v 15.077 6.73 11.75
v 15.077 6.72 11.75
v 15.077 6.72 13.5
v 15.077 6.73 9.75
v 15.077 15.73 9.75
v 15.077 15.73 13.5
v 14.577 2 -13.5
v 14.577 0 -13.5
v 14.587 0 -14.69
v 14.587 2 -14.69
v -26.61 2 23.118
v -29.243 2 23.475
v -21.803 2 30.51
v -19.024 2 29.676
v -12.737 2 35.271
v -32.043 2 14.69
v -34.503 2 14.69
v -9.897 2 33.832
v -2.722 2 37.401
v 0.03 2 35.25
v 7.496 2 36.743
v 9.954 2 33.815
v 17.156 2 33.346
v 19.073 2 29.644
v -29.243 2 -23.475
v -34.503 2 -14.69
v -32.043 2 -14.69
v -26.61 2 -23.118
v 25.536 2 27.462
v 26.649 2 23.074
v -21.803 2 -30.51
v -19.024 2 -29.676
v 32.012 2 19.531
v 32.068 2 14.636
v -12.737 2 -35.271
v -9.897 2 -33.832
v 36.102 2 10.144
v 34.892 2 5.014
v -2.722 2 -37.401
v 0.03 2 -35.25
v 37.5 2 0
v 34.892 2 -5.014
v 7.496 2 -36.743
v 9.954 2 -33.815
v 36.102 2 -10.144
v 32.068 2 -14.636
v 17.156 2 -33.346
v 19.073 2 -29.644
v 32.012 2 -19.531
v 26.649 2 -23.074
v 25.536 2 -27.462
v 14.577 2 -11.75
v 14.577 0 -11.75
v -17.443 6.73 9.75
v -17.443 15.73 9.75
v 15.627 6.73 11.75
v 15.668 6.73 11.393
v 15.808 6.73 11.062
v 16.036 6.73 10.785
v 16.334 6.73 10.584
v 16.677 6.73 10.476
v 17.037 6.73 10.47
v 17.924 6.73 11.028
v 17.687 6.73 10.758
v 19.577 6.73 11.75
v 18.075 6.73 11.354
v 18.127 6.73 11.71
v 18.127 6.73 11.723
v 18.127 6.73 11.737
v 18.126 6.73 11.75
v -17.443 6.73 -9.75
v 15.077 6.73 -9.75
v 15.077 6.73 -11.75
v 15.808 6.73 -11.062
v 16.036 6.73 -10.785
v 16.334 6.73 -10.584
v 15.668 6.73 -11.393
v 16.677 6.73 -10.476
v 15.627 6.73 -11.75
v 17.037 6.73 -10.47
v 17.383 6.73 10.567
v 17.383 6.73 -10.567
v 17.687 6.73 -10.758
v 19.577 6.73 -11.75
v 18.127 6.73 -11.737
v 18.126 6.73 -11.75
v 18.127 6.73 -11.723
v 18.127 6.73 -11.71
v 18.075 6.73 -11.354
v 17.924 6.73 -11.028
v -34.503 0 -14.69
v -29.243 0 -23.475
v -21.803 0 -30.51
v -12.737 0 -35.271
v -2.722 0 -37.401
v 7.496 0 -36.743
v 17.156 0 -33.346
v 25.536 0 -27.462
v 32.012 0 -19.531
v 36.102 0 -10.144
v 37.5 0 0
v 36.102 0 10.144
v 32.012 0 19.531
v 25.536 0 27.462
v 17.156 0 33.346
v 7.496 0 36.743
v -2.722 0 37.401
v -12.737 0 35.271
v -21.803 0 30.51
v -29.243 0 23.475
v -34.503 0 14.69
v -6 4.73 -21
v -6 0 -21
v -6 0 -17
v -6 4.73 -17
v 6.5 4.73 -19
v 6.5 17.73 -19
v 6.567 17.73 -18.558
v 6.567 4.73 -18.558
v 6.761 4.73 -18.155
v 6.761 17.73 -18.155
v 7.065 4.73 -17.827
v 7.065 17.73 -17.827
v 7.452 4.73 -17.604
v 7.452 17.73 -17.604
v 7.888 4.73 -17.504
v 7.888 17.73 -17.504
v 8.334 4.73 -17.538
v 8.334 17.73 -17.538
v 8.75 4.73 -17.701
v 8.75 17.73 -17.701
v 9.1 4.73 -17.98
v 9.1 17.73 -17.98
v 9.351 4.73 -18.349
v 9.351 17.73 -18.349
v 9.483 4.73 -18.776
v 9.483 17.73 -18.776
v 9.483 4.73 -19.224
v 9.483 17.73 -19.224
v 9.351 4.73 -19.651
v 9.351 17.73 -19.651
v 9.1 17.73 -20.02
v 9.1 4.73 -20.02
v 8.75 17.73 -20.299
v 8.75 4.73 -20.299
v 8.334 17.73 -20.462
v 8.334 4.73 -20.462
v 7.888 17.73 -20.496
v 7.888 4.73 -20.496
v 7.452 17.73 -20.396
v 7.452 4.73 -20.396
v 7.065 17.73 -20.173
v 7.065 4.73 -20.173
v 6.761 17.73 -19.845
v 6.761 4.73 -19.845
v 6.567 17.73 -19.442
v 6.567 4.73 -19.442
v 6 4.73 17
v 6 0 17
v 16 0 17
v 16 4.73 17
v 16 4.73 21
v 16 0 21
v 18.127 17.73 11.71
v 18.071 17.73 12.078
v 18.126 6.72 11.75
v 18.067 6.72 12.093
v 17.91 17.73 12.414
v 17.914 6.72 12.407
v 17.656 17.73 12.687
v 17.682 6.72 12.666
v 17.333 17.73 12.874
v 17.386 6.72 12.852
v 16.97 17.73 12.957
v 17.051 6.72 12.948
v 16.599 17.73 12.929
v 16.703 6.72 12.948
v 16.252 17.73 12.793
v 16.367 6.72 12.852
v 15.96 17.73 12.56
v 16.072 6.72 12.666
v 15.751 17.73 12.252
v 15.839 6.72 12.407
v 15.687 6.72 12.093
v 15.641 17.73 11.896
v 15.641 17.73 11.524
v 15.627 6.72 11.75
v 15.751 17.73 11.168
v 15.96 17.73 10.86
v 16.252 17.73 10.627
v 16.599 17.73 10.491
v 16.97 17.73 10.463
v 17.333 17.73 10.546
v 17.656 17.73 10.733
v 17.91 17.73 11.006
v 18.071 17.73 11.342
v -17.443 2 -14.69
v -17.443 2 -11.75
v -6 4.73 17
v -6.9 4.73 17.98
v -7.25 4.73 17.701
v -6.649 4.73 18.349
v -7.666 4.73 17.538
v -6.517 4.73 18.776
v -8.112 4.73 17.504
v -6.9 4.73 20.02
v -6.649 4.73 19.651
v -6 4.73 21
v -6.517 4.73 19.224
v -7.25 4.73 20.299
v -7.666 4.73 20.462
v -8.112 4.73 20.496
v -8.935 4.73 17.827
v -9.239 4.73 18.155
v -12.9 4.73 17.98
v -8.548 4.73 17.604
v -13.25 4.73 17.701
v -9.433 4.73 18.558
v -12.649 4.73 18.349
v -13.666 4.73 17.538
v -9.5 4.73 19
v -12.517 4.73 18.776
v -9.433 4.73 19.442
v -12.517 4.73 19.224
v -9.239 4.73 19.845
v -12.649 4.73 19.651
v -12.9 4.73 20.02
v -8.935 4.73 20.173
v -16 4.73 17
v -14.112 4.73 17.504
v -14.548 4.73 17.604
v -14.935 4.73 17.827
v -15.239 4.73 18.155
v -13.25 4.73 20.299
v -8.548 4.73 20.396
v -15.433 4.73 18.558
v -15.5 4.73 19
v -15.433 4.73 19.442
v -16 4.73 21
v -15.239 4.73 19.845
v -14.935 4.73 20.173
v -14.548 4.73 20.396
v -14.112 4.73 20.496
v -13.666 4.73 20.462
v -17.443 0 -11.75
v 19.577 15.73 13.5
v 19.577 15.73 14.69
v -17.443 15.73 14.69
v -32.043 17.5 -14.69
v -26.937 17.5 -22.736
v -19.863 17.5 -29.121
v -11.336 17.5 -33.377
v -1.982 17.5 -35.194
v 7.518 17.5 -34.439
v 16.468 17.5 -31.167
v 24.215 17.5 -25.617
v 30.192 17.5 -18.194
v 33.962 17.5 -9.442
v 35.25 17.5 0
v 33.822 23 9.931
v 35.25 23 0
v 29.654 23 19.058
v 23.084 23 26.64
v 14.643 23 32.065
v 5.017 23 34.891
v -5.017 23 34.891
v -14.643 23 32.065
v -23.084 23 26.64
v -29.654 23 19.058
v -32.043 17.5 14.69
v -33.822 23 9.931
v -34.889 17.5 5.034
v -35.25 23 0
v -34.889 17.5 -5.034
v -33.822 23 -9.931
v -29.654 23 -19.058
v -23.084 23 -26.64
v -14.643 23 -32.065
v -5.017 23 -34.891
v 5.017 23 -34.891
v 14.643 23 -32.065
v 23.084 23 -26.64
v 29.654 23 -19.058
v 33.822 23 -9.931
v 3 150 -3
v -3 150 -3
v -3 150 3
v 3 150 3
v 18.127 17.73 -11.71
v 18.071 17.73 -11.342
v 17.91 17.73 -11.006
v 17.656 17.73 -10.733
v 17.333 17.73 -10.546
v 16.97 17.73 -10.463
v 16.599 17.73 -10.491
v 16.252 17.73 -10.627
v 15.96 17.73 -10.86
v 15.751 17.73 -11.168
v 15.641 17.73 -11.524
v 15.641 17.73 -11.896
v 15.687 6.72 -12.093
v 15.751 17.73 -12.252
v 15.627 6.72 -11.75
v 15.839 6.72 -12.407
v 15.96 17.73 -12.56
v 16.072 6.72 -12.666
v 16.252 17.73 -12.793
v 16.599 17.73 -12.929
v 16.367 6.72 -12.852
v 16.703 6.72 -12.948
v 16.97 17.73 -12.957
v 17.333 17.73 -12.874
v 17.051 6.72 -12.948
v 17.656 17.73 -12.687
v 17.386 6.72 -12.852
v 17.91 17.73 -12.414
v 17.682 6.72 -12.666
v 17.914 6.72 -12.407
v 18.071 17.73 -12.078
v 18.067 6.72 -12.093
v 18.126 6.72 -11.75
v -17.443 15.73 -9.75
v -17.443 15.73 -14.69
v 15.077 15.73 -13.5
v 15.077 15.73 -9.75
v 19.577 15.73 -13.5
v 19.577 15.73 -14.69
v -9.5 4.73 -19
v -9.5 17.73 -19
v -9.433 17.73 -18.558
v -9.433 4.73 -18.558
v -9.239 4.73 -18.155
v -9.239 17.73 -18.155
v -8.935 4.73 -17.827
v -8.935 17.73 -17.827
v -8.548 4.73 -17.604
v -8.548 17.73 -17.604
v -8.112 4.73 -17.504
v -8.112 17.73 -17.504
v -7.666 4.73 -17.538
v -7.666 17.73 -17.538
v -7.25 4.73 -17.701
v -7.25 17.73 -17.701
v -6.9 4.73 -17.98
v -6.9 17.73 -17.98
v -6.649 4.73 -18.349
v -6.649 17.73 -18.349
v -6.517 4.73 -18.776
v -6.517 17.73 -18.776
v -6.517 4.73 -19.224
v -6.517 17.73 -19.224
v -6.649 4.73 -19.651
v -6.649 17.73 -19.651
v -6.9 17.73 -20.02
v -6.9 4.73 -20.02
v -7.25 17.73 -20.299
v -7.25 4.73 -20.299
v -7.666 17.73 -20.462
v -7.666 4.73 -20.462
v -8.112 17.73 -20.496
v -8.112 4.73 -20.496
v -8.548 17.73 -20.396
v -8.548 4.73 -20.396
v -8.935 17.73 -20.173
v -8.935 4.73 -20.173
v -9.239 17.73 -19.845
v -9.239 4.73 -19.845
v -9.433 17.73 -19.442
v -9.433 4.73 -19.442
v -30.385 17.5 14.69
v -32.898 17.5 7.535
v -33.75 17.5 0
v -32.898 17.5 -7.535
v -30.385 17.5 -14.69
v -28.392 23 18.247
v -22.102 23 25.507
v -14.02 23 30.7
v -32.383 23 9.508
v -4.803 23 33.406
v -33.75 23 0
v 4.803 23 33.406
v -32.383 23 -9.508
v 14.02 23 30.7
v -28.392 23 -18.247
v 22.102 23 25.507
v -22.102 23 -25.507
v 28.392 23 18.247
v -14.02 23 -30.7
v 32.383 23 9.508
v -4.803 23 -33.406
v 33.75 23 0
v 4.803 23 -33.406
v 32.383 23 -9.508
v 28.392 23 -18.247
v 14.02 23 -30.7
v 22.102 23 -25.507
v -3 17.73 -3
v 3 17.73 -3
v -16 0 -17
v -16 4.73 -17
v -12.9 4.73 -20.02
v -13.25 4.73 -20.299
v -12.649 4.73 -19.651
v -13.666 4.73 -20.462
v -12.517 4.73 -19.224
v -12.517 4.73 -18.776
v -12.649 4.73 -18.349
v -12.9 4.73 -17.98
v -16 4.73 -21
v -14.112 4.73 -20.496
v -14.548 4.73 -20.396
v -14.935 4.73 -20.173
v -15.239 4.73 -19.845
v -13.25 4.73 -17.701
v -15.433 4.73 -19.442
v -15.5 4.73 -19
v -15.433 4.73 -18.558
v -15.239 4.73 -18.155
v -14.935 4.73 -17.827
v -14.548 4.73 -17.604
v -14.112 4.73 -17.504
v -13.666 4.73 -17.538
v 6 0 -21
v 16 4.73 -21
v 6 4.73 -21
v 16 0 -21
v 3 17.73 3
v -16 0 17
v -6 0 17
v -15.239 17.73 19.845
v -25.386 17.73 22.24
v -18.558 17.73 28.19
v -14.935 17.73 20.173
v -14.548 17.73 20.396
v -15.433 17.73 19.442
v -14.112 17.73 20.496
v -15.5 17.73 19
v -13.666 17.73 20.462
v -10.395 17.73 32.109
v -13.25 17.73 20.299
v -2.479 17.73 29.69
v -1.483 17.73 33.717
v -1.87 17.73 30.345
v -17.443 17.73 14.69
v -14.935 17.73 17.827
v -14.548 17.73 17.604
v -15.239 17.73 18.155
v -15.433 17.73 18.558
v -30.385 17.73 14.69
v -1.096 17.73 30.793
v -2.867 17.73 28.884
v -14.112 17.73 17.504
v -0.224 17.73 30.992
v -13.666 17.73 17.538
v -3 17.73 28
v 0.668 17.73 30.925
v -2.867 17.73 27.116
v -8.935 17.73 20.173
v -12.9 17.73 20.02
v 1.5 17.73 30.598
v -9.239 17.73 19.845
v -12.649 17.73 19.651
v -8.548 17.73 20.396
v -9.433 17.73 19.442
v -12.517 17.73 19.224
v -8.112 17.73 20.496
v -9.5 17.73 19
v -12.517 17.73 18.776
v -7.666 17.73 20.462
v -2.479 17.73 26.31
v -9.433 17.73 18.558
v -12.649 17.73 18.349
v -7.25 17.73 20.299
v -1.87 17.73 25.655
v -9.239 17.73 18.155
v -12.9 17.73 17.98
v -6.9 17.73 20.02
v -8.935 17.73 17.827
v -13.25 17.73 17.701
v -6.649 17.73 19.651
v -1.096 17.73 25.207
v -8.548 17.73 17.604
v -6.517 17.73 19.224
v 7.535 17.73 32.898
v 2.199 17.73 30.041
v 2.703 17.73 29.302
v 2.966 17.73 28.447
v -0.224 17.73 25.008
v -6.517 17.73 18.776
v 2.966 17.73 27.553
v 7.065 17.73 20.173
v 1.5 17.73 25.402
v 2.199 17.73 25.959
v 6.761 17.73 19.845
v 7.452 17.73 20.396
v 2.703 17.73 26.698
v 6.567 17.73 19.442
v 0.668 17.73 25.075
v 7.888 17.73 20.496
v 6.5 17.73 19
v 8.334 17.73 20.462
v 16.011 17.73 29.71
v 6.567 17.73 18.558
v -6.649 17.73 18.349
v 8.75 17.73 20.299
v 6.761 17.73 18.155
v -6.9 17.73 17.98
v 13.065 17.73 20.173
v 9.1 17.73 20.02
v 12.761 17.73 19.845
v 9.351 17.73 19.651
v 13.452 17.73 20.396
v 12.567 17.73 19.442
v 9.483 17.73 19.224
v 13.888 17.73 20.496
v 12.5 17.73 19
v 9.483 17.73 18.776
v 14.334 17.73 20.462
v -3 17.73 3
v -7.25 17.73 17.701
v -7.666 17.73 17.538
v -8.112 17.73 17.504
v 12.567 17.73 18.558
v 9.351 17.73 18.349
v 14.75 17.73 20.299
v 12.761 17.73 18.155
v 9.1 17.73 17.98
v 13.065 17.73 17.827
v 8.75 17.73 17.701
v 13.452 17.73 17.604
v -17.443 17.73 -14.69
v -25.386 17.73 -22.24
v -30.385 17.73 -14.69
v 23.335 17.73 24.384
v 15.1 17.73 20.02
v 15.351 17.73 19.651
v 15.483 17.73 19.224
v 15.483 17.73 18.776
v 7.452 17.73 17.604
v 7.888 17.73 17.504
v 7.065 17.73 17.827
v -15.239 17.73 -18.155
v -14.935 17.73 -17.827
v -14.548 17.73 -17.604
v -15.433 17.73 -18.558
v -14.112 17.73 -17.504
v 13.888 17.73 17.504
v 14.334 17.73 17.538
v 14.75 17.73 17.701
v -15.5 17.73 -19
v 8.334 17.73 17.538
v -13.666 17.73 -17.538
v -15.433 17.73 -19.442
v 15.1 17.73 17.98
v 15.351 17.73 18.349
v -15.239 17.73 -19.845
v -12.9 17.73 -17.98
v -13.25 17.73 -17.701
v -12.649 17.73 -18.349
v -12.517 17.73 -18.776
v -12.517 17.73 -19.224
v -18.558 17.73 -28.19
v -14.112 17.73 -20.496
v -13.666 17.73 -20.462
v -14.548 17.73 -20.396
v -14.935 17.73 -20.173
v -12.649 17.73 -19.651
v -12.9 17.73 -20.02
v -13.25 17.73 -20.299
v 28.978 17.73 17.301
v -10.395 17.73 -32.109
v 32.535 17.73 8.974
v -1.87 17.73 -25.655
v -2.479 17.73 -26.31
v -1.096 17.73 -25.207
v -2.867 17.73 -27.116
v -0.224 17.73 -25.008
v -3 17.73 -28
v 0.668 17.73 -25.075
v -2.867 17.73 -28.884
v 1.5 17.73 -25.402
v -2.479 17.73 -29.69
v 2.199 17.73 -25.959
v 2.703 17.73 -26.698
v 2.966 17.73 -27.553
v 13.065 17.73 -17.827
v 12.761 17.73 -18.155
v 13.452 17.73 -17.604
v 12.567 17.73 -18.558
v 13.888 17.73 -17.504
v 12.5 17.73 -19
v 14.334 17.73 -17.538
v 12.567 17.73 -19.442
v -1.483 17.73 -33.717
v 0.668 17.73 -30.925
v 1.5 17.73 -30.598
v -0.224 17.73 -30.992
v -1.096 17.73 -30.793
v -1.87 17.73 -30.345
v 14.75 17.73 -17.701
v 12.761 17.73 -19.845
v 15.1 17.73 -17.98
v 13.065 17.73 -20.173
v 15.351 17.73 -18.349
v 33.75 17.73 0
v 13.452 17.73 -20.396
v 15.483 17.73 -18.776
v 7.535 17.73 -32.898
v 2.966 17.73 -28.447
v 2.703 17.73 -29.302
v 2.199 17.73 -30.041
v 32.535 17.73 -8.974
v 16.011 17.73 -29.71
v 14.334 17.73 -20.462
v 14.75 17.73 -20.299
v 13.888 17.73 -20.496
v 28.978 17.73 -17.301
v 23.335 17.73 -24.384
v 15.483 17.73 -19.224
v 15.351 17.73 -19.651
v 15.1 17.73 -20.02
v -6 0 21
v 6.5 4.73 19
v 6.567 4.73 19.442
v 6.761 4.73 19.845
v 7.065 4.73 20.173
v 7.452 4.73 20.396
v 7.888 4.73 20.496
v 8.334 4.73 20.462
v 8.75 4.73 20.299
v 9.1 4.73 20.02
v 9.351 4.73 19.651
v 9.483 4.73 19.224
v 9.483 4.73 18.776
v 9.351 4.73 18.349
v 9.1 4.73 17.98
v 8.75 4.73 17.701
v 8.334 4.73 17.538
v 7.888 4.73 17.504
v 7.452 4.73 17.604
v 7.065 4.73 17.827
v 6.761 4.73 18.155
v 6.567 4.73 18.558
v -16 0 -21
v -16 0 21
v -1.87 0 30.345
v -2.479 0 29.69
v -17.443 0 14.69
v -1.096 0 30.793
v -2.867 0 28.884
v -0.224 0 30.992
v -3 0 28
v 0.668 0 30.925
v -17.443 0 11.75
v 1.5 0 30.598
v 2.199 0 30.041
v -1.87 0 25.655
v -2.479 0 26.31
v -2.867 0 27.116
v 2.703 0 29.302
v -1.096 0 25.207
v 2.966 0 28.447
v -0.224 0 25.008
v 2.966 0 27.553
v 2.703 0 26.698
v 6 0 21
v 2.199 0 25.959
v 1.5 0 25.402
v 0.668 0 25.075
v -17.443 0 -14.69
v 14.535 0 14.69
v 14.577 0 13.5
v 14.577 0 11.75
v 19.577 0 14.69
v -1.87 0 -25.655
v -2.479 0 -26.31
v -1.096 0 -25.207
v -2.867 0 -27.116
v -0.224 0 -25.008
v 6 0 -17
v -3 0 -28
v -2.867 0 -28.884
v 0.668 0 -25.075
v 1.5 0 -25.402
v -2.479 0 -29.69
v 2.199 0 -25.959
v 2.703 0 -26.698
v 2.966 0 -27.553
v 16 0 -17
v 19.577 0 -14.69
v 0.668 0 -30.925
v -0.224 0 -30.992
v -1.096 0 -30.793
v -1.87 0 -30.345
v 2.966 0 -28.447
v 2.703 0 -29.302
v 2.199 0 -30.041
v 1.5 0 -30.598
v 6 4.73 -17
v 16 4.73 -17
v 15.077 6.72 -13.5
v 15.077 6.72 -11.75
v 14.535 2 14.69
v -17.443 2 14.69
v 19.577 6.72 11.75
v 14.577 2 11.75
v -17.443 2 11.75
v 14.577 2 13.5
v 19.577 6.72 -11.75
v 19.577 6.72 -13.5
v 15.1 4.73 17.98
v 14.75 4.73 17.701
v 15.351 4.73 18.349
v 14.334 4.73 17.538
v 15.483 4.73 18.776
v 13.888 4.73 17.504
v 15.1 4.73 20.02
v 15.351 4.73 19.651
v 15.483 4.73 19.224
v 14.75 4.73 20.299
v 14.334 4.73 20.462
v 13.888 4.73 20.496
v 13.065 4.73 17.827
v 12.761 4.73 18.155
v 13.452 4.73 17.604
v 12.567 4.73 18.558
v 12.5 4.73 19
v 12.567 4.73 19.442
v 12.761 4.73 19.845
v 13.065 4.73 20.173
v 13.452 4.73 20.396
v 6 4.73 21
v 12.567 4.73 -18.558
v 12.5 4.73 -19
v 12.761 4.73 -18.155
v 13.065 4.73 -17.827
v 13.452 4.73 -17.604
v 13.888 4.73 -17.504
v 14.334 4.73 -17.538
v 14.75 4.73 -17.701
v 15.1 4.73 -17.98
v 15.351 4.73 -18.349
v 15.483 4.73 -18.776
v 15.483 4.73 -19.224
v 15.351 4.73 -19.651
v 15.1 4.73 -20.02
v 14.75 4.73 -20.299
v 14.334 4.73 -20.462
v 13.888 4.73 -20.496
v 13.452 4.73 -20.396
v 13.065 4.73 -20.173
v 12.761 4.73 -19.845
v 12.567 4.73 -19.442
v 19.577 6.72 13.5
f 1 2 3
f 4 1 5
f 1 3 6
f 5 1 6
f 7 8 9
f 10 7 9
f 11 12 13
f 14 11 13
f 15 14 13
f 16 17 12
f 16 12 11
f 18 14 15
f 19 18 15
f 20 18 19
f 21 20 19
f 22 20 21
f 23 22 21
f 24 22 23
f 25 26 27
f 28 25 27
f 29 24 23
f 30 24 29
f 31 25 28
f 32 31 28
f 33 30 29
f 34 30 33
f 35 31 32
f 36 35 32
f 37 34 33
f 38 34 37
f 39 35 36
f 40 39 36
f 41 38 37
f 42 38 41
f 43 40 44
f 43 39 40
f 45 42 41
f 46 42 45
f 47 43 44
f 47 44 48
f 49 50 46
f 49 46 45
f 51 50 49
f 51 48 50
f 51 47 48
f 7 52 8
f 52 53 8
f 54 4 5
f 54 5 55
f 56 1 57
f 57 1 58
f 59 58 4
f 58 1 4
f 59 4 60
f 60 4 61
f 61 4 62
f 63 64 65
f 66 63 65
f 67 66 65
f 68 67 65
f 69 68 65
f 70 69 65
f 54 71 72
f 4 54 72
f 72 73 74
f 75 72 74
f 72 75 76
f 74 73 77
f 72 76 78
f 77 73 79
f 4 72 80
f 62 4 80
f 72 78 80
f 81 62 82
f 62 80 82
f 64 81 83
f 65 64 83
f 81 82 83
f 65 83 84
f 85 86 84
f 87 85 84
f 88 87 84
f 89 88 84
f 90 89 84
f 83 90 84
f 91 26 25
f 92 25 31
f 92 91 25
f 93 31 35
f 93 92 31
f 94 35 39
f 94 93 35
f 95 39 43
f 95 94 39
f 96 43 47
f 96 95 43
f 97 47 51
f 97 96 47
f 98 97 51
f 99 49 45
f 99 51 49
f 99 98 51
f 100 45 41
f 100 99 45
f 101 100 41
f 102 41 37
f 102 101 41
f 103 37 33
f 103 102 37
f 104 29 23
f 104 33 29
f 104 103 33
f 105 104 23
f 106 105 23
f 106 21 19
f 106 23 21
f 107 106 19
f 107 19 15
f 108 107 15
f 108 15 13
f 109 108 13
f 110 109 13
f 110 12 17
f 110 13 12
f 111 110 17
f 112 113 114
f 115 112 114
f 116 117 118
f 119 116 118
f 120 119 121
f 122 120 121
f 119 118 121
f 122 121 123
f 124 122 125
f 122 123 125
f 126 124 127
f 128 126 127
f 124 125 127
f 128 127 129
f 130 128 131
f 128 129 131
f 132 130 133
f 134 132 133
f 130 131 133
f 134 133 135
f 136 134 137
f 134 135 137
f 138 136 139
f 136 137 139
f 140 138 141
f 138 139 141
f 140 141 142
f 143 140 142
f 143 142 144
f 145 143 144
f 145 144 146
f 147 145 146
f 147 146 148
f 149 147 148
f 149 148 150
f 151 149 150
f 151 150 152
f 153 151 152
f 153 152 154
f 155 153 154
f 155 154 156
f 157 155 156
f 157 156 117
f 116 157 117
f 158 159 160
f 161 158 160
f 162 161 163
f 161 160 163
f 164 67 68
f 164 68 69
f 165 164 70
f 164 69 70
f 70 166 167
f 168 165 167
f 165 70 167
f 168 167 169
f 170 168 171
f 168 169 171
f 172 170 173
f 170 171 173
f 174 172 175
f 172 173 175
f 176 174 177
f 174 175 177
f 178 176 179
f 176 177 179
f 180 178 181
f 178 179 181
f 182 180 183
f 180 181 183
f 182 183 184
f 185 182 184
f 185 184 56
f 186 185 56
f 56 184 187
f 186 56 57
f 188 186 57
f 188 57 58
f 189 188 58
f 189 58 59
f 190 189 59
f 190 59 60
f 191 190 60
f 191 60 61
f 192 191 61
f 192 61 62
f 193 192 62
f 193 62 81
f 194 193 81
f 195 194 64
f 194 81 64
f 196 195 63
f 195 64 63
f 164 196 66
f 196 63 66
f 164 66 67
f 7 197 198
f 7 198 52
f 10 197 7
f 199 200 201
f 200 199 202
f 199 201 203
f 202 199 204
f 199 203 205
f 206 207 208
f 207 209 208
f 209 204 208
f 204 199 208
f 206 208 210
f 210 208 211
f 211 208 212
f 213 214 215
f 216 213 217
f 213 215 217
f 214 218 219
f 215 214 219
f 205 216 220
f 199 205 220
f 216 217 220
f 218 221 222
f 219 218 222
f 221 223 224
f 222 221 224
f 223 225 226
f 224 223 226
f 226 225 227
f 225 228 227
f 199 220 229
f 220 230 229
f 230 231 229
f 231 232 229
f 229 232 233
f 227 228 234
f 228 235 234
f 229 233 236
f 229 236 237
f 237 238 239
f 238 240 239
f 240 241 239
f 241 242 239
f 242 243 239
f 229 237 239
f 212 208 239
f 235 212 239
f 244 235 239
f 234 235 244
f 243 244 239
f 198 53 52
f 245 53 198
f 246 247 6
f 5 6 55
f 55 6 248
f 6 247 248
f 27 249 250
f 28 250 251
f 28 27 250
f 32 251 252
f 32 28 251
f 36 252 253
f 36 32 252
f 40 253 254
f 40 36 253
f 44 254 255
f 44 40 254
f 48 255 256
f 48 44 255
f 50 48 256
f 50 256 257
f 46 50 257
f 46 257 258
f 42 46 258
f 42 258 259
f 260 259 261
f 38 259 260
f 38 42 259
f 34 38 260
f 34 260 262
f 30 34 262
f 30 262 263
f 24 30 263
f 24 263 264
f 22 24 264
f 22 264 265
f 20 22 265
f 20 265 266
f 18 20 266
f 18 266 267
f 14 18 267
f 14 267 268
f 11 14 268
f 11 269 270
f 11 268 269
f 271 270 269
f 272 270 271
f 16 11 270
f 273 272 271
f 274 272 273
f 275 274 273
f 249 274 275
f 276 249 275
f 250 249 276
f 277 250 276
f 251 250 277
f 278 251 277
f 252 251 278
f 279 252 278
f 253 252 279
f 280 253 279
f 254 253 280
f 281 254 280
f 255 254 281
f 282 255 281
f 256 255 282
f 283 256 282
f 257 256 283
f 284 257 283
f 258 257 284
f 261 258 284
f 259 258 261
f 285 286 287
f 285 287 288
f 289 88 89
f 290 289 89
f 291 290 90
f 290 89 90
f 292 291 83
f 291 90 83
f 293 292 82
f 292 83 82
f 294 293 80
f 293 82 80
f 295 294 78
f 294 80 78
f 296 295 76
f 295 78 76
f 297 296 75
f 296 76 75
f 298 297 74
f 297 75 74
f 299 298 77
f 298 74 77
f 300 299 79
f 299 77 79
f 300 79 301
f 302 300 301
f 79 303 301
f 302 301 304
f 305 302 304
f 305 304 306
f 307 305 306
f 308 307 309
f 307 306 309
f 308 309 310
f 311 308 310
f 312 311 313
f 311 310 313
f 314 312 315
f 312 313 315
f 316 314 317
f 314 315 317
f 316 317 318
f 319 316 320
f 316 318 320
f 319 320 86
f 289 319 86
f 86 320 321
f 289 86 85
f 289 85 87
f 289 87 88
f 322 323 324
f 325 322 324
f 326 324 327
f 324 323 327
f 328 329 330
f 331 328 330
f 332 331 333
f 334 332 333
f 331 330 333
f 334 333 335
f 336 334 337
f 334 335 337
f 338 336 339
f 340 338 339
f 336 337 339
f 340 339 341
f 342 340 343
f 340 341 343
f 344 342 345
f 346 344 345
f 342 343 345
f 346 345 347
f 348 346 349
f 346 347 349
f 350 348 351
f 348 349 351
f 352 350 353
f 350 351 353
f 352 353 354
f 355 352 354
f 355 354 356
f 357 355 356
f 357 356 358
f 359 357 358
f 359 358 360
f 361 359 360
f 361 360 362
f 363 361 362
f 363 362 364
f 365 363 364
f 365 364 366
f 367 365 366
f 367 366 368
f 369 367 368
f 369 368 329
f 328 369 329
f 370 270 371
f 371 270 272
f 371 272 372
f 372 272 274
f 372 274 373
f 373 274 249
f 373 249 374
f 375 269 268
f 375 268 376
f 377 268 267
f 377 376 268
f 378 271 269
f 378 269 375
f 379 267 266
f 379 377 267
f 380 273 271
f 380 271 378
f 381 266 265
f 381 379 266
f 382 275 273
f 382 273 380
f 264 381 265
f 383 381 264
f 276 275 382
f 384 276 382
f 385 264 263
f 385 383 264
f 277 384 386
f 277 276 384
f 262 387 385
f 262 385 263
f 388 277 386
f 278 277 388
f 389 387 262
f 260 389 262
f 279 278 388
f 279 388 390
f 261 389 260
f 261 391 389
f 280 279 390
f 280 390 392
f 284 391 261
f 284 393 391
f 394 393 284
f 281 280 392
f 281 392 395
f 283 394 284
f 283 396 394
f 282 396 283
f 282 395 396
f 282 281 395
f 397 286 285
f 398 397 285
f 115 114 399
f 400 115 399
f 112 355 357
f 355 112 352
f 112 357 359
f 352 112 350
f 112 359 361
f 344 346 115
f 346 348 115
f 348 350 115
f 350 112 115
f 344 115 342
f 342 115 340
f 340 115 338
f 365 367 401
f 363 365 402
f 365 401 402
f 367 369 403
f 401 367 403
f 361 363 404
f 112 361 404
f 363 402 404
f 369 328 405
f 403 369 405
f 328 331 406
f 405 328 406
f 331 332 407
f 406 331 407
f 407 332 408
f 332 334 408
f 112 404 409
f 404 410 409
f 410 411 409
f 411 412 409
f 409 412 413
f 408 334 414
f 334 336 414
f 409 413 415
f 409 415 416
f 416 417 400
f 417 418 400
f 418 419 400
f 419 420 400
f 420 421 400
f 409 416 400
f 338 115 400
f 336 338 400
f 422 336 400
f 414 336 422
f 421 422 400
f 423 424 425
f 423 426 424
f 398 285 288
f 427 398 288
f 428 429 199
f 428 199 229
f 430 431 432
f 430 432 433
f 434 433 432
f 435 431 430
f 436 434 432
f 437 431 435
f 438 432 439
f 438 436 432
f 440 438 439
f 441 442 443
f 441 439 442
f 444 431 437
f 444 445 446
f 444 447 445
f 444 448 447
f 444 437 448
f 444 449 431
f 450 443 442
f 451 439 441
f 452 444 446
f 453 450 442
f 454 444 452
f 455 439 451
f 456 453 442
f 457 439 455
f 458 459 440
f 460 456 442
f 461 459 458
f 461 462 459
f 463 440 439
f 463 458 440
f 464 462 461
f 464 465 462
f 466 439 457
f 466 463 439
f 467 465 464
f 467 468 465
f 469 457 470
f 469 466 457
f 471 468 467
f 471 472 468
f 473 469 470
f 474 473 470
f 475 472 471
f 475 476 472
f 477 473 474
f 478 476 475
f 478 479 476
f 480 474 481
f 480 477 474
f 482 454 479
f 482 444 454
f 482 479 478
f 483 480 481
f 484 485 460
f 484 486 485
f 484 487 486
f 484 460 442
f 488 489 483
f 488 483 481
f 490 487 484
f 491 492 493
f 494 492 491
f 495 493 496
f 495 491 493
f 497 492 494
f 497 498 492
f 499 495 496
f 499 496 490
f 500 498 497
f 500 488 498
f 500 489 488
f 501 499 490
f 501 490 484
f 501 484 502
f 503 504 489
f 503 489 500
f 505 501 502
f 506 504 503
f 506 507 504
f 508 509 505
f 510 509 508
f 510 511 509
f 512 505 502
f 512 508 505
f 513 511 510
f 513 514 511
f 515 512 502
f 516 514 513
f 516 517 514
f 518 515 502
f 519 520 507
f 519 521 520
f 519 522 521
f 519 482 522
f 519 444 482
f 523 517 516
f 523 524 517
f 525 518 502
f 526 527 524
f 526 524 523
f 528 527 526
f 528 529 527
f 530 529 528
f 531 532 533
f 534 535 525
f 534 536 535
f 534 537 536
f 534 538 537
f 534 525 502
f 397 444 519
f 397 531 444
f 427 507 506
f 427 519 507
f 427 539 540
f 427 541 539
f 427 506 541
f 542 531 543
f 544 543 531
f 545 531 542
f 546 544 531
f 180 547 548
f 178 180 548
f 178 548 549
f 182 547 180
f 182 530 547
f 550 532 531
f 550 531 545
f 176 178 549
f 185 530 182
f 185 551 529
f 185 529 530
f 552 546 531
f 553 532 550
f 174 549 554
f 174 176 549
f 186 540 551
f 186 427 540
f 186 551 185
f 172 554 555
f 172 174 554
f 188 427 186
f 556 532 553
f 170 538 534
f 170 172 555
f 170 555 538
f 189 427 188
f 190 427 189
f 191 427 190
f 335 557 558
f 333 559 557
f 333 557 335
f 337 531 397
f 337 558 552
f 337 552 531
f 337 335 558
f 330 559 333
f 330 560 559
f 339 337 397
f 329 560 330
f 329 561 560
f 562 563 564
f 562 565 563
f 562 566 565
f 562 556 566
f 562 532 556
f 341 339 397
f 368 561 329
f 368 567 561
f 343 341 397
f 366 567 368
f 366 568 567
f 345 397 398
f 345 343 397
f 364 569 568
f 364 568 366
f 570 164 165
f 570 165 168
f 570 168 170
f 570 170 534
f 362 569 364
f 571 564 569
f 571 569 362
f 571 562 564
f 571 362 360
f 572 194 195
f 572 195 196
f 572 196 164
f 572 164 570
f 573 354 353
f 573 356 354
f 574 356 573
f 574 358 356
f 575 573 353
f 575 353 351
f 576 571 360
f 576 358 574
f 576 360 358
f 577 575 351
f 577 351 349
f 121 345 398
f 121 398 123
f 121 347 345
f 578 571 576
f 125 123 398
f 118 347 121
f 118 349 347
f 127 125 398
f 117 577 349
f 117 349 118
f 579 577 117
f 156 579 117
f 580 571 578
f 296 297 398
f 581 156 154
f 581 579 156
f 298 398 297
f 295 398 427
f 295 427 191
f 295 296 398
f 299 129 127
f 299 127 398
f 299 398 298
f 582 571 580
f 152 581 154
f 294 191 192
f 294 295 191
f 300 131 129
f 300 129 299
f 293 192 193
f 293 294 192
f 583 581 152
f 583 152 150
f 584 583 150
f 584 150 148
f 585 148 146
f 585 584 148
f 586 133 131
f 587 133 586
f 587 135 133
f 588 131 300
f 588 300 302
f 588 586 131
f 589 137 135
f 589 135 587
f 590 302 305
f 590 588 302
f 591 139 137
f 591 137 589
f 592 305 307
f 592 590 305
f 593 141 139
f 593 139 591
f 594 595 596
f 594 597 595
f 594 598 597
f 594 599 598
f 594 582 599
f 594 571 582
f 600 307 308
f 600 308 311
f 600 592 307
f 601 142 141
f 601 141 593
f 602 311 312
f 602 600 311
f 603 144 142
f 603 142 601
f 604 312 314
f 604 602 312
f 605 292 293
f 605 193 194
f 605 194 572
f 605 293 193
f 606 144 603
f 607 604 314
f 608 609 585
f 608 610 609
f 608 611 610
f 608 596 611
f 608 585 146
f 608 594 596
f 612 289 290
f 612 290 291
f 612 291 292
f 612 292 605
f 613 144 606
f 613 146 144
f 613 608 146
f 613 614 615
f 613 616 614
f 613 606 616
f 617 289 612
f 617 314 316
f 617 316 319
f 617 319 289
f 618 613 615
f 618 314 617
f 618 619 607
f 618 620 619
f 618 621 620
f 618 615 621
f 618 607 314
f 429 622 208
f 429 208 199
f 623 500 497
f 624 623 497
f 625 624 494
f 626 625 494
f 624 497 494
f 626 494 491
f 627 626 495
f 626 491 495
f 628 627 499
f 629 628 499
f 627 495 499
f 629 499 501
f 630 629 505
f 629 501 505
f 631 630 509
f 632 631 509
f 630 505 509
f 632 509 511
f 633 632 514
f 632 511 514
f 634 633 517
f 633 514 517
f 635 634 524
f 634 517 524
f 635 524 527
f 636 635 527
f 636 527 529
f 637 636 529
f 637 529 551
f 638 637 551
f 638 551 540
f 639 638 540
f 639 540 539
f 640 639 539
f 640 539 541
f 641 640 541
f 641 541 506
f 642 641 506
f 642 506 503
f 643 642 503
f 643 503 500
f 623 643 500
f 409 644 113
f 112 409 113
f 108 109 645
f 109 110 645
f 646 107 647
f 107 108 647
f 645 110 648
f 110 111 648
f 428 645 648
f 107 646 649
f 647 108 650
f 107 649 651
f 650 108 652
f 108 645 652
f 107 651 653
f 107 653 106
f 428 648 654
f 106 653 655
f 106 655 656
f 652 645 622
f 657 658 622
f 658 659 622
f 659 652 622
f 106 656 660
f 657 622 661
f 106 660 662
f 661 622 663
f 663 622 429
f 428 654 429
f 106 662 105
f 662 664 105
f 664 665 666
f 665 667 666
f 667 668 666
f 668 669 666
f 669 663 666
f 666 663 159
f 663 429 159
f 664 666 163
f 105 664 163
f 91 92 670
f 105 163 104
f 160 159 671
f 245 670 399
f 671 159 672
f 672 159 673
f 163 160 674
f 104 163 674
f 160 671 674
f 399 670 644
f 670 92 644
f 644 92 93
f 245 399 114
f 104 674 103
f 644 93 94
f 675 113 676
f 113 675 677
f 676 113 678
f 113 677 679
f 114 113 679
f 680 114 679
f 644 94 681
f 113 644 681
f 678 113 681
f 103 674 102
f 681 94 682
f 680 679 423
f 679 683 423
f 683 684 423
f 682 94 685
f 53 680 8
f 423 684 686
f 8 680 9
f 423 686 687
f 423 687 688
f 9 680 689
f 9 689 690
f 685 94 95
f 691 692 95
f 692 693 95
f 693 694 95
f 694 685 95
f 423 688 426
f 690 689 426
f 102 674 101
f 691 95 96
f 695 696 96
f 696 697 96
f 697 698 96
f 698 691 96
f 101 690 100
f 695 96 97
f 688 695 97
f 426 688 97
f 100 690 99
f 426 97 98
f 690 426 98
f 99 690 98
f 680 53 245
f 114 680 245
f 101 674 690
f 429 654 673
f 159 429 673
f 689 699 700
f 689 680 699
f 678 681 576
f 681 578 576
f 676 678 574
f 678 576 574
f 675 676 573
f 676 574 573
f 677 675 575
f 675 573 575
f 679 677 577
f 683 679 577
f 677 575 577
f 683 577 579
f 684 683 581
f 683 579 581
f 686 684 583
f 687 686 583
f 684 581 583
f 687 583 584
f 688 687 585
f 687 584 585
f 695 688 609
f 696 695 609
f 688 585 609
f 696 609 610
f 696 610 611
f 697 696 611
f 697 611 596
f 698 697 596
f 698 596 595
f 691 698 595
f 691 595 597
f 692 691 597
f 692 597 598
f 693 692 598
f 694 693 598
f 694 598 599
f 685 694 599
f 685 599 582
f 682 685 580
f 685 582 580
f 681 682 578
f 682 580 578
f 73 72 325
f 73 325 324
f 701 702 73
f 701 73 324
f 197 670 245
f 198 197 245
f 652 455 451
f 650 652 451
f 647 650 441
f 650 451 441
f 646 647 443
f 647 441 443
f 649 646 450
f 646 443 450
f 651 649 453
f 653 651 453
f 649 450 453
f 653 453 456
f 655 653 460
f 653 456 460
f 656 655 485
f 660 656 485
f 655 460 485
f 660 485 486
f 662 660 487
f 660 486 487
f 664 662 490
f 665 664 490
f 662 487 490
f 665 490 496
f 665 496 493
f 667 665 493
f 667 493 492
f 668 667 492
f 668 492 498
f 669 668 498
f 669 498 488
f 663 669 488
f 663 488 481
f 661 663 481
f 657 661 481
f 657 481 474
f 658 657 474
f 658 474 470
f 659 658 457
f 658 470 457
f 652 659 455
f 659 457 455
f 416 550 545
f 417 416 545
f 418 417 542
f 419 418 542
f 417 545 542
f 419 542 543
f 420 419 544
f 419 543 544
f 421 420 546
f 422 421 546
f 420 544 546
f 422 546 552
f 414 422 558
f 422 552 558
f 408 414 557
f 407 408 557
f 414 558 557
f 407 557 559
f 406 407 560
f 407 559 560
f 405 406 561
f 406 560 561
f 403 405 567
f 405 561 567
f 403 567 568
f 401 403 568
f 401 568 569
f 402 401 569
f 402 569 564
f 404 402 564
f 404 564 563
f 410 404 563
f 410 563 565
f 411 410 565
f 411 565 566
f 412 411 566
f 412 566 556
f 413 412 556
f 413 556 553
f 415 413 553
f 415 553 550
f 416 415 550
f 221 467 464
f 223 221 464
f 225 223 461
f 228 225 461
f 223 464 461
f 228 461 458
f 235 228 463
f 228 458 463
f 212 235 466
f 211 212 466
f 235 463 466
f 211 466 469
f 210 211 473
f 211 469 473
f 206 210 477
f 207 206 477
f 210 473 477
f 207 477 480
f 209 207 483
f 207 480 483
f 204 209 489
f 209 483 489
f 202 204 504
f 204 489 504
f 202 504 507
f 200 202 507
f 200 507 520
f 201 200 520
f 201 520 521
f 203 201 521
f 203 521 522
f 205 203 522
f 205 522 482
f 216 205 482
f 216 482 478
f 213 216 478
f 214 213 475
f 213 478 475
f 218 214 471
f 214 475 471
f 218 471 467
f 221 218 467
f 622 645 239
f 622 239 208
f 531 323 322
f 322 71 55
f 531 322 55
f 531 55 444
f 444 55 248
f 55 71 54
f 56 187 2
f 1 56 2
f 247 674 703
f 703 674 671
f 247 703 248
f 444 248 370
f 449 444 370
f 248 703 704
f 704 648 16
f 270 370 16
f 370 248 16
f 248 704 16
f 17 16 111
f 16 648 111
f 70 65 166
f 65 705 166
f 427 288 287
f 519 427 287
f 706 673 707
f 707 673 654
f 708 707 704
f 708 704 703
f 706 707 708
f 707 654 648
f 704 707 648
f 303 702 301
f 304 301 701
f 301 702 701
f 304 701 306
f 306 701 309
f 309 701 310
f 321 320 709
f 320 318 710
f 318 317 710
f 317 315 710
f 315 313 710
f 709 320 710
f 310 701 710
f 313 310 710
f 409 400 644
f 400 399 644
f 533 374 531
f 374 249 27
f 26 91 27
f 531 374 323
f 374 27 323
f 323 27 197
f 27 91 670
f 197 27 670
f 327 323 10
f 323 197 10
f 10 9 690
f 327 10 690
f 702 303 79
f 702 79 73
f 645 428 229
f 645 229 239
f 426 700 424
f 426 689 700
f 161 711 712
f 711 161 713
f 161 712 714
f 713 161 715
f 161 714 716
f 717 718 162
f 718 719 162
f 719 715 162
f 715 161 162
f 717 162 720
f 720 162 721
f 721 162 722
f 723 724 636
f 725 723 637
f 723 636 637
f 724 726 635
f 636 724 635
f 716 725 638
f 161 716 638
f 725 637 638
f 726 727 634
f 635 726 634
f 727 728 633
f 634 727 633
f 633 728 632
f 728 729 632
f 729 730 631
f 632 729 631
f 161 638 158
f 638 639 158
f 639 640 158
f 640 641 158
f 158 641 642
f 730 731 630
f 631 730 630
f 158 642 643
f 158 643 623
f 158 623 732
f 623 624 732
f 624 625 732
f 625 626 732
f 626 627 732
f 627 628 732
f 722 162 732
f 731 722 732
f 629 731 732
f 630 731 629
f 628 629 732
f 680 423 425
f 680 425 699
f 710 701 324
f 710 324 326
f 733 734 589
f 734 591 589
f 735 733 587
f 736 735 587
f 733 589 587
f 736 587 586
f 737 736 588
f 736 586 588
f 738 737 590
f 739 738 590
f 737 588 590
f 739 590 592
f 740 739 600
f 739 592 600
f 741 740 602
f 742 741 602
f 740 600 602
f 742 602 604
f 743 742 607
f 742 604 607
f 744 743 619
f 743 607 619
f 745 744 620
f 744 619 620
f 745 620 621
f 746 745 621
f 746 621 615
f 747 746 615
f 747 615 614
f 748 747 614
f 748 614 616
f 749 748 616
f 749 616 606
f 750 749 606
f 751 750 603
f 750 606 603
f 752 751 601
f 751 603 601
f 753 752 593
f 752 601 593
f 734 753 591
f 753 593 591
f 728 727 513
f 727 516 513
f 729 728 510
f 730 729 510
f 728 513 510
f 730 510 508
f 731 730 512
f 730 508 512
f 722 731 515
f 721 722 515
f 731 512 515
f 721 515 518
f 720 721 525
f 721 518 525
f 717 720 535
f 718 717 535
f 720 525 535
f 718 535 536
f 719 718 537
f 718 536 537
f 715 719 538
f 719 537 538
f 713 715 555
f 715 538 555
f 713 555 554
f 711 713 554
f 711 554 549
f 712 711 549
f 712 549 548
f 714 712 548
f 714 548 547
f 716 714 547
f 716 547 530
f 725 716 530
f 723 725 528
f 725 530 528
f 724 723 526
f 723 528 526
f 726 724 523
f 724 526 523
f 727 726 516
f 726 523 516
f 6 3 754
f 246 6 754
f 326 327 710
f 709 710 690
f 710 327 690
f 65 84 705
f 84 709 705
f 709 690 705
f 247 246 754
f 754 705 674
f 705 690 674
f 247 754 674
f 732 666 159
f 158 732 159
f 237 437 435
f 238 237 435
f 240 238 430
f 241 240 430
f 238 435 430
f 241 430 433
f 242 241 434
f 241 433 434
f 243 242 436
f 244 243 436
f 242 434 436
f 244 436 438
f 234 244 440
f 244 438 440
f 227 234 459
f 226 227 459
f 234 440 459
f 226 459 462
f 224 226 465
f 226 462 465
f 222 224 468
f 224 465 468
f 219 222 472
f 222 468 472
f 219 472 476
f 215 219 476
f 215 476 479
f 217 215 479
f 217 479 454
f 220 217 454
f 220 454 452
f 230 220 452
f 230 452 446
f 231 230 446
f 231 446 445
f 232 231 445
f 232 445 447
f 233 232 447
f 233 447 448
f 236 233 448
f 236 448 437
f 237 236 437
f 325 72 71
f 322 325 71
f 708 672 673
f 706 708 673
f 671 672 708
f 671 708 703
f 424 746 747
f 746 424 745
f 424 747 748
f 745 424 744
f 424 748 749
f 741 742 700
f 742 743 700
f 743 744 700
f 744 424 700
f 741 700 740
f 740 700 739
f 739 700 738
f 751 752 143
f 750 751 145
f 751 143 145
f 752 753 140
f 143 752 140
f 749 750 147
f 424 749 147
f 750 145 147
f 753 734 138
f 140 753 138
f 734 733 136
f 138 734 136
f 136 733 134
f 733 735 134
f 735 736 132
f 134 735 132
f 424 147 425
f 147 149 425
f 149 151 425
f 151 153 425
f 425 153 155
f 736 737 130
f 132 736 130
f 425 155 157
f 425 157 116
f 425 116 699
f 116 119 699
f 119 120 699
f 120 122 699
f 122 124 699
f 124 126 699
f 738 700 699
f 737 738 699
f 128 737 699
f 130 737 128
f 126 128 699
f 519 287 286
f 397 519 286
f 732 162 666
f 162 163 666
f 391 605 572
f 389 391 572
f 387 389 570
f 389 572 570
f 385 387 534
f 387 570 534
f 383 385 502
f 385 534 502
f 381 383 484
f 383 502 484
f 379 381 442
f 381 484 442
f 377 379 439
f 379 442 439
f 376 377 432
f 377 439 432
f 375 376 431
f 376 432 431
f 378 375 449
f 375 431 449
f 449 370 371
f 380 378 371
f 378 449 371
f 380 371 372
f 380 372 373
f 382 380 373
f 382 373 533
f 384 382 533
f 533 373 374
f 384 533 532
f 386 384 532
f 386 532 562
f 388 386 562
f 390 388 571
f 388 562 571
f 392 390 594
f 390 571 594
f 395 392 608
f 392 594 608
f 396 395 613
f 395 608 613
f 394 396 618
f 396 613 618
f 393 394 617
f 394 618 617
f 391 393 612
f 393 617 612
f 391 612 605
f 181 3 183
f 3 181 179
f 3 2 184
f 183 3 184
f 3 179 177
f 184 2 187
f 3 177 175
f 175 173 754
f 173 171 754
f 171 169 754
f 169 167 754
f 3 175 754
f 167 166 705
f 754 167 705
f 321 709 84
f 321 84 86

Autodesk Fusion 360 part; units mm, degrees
sketch "Sketch1" plane through (0, 0, 0) normal (0, 1, 0) x (1, 0, 0) in component "Base"
  circle A0 centre (0, 0) radius 37.5
  circle A1 centre (0, 0) radius 35.25
  circle A2 centre (0, 0) radius 33.75
  dimension "d8" = 70.5
  dimension "d82" = -1.5
sketch "Sketch1 (2)" plane through (0, 0, 0) normal (0, 1, 0) x (1, 0, 0) in component "Esp32 Module"
  line L0 (19.5768, -14.69) -> (-32.0432, -14.69)
  line L1 (-32.0432, -14.69) -> (-32.0432, 14.69)
  line L2 (-32.0432, 14.69) -> (19.5768, 14.69)
  line L3 (19.5768, 14.69) -> (19.5768, -14.69)
  line L4 (19.5768, -14.69) -> (-32.0432, 14.69) construction
  line L5 (-32.0432, -14.69) -> (19.5768, 14.69) construction
  circle A0 centre (0, 0) radius 35.25
  line L6 (-32.0432, 4.01) -> (-26.5332, 4.01)
  line L7 (-26.5332, 4.01) -> (-26.5332, -3.49)
  line L8 (-26.5332, -3.49) -> (-32.0432, -3.49)
  line L9 (-32.0432, -3.49) -> (-32.0432, 4.01)
  line L10 (-32.0432, 14.69) -> (-28.6432, 14.69) construction
  line L11 (-28.6432, 14.69) -> (-28.6432, 8.19) construction
  line L12 (-28.6432, 8.19) -> (-32.0432, 8.19) construction
  line L13 (-32.0432, 8.19) -> (-32.0432, 14.69) construction
  circle A1 centre (-28.6432, 8.19) radius 1.5
  line L14 (-32.0432, -8.19) -> (-28.6432, -8.19) construction
  line L15 (-28.6432, -8.19) -> (-28.6432, -14.69) construction
  line L16 (-28.6432, -14.69) -> (-32.0432, -14.69) construction
  line L17 (-32.0432, -14.69) -> (-32.0432, -8.19) construction
  circle A2 centre (-28.6432, -8.19) radius 1.5
  line L18 (-32.0432, -14.69) -> (-18.9432, -14.69) construction
  line L19 (-18.9432, -14.69) -> (-18.9432, -8.59) construction
  line L20 (-18.9432, -8.59) -> (-32.0432, -8.59) construction
  line L21 (-32.0432, -8.59) -> (-32.0432, -14.69) construction
  line L22 (-17.4432, -7.09) -> (-20.4432, -7.09)
  line L23 (-20.4432, -7.09) -> (-20.4432, -10.09)
  line L24 (-20.4432, -10.09) -> (-17.4432, -10.09)
  line L25 (-17.4432, -10.09) -> (-17.4432, -7.09)
  line L26 (-17.4432, -7.09) -> (-20.4432, -10.09) construction
  line L27 (-20.4432, -7.09) -> (-17.4432, -10.09) construction
  line L28 (19.5768, 14.69) -> (-17.4432, 14.69)
  line L29 (-17.4432, 14.69) -> (-17.4432, -14.69)
  line L30 (-17.4432, -14.69) -> (19.5768, -14.69)
  line L31 (19.5768, -14.69) -> (19.5768, 14.69)
  circle A3 centre (0, 0) radius 37.5
  line L32 (-32.0432, 14.69) -> (-34.503, 14.69)
  line L33 (-32.0432, -14.69) -> (-34.503, -14.69)
  arc A4 (-34.503, 14.69) -> (-34.503, -14.69) centre (-1.1733, 0) ccw
  line L34 (-17.4432, -13.5) -> (19.5768, -13.5)
  line L35 (19.5768, -13.5) -> (19.5768, -11.75)
  line L36 (19.5768, -11.75) -> (-17.4432, -11.75)
  line L37 (-17.4432, -11.75) -> (-17.4432, -13.5)
  line L38 (-6.2332, 0) -> (19.5768, 0) construction
  line L39 (-17.4432, 13.5) -> (19.5768, 13.5)
  line L40 (19.5768, 11.75) -> (-17.4432, 11.75)
  line L41 (-17.4432, 11.75) -> (-17.4432, 13.5)
  line L42 (19.5768, -14.69) -> (19.5768, 14.69)
  line L43 (-17.4432, 13.5) -> (-32.5624, 13.5)
  line L44 (-17.4432, 11.75) -> (-33.234, 11.75)
  line L45 (-17.4432, -11.75) -> (-33.234, -11.75)
  line L46 (-17.4432, -13.5) -> (-32.5624, -13.5)
  line L47 (19.5768, 0) -> (16.8768, 0)
  line L48 (16.8768, 0) -> (16.8768, -11.71)
  line L49 (16.8768, -11.71) -> (19.5768, -11.71)
  line L50 (19.5768, -11.71) -> (19.5768, 0)
  circle A5 centre (16.8768, -11.71) radius 1.25
  circle A6 centre (16.8768, 11.71) radius 1.25
  line L51 (19.5768, -13.5) -> (14.5768, -13.5)
  line L52 (14.5768, -13.5) -> (14.5768, 13.5)
  line L53 (14.5768, 13.5) -> (19.5768, 13.5)
  line L54 (19.5768, 13.5) -> (19.5768, -13.5)
  line L55 (14.5768, 13.5) -> (14.5867, 14.69)
  line L56 (14.5768, -13.5) -> (14.5349, -14.69)
  point P0 (-6.2332, 0)
  point P1 (-18.9432, -8.59)
  dimension "d9" = 51.62
  dimension "d10" = 29.38
  dimension "d15" = 5.51
  dimension "d16" = 7.5
  dimension "d17" = 18.18
  dimension "d18" = 3.4
  dimension "d19" = 6.5
  dimension "d20" = 3
  dimension "d21" = 3.4
  dimension "d22" = 6.5
  dimension "d23" = 3
  dimension "d24" = 13.1
  dimension "d25" = 6.1
  dimension "d26" = 3
  dimension "d27" = 3
  dimension "d32" = 1.75
  dimension "d33" = 1.19
  dimension "d99" = 2.7
  dimension "d100" = 11.71
  dimension "d101" = 2.5
  dimension "d104" = 5
extrude "Extrude1" add sketch "Sketch1 (2)" along normal blind 2 contours L0 L2 L3 A0 L28 L30 L31 L35 L42 L50 L54 | L0 L3 L30 L31 L34 L42 L51 L56 | L0 L29 L30 L34 L56 | L3 L31 L34 L35 L36 L42 A5 L51 L52 L54 | L29 L34 L36 L37 L52 | L3 L31 L36 L42 L49 A5 L54 | A0 A3 L32 L33 | L3 L31 L36 L40 L42 L47 L48 A5 A6 L52 L54 | L25 L29 L36 L40 L52 | L3 L31 L42 L47 L48 L49 L50 A5 L54 | L36 A5 | L36 L48 L49 A5 | L3 L31 L39 L40 L42 A6 L52 L53 L54 | L29 L39 L40 L41 L52 | L48 L49 A5 | L40 A6 | L40 A6 | L2 L3 L28 L31 L39 L42 L53 L55 | L2 L28 L29 L39 L55 picked at (-31.2352, 17.761) makes body 1 in component "Esp32 Module"
extrude "Extrude2" add sketch "Sketch1 (2)" along normal blind 6.73 contours L0 L2 L3 A0 L28 L30 L31 L35 L42 L50 L54 bodies 1 in component "Esp32 Module"
ref_plane "WorkPlane1" through (1.6034, 6.73, 0) normal (0, 1, 0) x (1, 0, 0) in component "Esp32 Module"
extrude "Extrude3" add sketch "Sketch1 (2)" along normal blind 17.73 and the other way blind -6.73 separate body contours L0 L2 L3 A0 L28 L30 L31 L35 L42 L50 L54 | L0 L3 L30 L31 L34 L42 L51 L56 | L0 L29 L30 L34 L56 | L3 L31 L34 L35 L36 L42 A5 L51 L52 L54 | L0 L1 L29 L46 | L29 L34 L36 L37 L52 | L3 L31 L36 L42 L49 A5 L54 | L1 A0 L46 | L1 L29 L37 L45 L46 | L3 L31 L36 L40 L42 L47 L48 A5 A6 L52 L54 | L25 L29 L36 L40 L52 | L3 L31 L42 L47 L48 L49 L50 A5 L54 | L36 A5 | L36 L48 L49 A5 | L1 A0 L45 L46 | L1 L6 L7 L8 L22 L23 L24 L29 L44 L45 | L3 L31 L39 L40 L42 A6 L52 L53 L54 | L29 L39 L40 L41 L52 | L48 L49 A5 | L1 A0 L9 L44 L45 | L1 L2 L29 L43 | L1 A0 L43 | L22 L23 L24 L25 L29 | L40 A6 | L40 A6 | L1 L29 L41 L43 L44 | L2 L3 L28 L31 L39 L42 L53 L55 | L2 L28 L29 L39 L55 | L1 L6 L7 L8 L9 | L1 A0 L43 L44 | A1 | A2 makes body 2 in component "Esp32 Module"
extrude "Extrude4" cut sketch "Sketch1 (2)" along normal blind 6.73 and the other way blind -15.73 contours L3 L31 L34 L35 L36 L42 A5 L51 L52 L54 | L29 L34 L36 L37 L52 | L36 A5 | L3 L31 L39 L40 L42 A6 L52 L53 L54 | L29 L39 L40 L41 L52 | L40 A6 picked at (16.6723, 12.0997) bodies 2 in component "Esp32 Module"
extrude "Extrude5" cut sketch "Sketch1 (2)" along normal blind 15.73 and the other way blind -6.73 contours L1 L29 L37 L45 L46 | L1 A0 L45 L46 | L1 L29 L41 L43 L44 | L1 A0 L43 L44 bodies 2 in component "Esp32 Module"
sketch "Sketch1 (3)" plane through (0, 0, 0) normal (0, 1, 0) x (1, 0, 0) in component "Tower"
  line L0 (-3, 3) -> (3, 3)
  line L1 (3, 3) -> (3, -3)
  line L2 (3, -3) -> (-3, -3)
  line L3 (-3, -3) -> (-3, 3)
  line L4 (-3, 3) -> (3, -3) construction
  line L5 (3, 3) -> (-3, -3) construction
  line L6 (-3.5, -3.5) -> (-2.5, -3.5)
  line L7 (-2.5, -3.5) -> (-2.5, -2.5)
  line L8 (-2.5, -2.5) -> (-3.5, -2.5)
  line L9 (-3.5, -2.5) -> (-3.5, -3.5)
  line L10 (-3.5, -3.5) -> (-2.5, -2.5) construction
  line L11 (-2.5, -3.5) -> (-3.5, -2.5) construction
  line L12 (0, 0) -> (0, -3) construction
  line L13 (0, 0) -> (3, 0) construction
  line L14 (2.5, -3.5) -> (2.5, -2.5)
  line L15 (2.5, -2.5) -> (3.5, -2.5)
  line L16 (3.5, -2.5) -> (3.5, -3.5)
  line L17 (3.5, -3.5) -> (2.5, -3.5)
  line L18 (3.5, 3.5) -> (2.5, 3.5)
  line L19 (2.5, 3.5) -> (2.5, 2.5)
  line L20 (2.5, 2.5) -> (3.5, 2.5)
  line L21 (3.5, 2.5) -> (3.5, 3.5)
  line L22 (-2.5, 3.5) -> (-2.5, 2.5)
  line L23 (-2.5, 2.5) -> (-3.5, 2.5)
  line L24 (-3.5, 2.5) -> (-3.5, 3.5)
  line L25 (-3.5, 3.5) -> (-2.5, 3.5)
  point P0 (-3, -3)
  dimension "d48" = 6
  dimension "d49" = 6
  dimension "d89" = 1
  dimension "d90" = 1
extrude "Extrude1'" add sketch "Sketch1 (3)" along normal blind 150 and the other way blind -17.5 separate body contours L0 L3 L22 L23 | L0 L1 L2 L3 L7 L8 L14 L15 L19 L20 L22 L23 | L0 L1 L19 L20 | L2 L3 L7 L8 | L1 L2 L14 L15 makes body 3 in component "Tower"
sketch "Sketch1 (4)" plane through (0, 0, 0) normal (0, 1, 0) x (1, 0, 0) in component "Lens"
  circle A0 centre (0, 0) radius 37.5
  circle A1 centre (0, 0) radius 35.5
  dimension "d54" = 75
extrude "Extrude1''" add sketch "Sketch1 (4)" along normal blind 160 and the other way blind -158 separate body contours A1 makes body 4 in component "Lens"
extrude "Extrude2'" add sketch "Sketch1 (4)" along normal blind 160 and the other way blind -2 bodies 4 in component "Lens"
extrude "Extrude6" cut sketch "Sketch1 (2)" along normal blind 18 and the other way blind -5 contours A0 A3 L32 L33 | L1 L6 L7 L8 L22 L23 L24 L29 L44 L45 | L1 A0 L9 L44 L45 | L22 L23 L24 L25 L29 | L1 L6 L7 L8 L9 | A1 | A2 picked at (-31.2352, 17.761) bodies 2 in component "Esp32 Module"
sketch "Sketch2" plane through (0, 0, 0) normal (1, 0, 0) x (0, 0, -1)
  line L0 (-4.9895, 1.2122) -> (5, 1.2122)
  line L1 (5, 1.2122) -> (5, 7.5)
  line L2 (5, 7.5) -> (-4.9895, 7.5)
  line L3 (-4.9895, 7.5) -> (-4.9895, 1.2122)
  line L4 (-4.9895, 1.2122) -> (5, 7.5) construction
  line L5 (5, 1.2122) -> (-4.9895, 7.5) construction
  point P0 (0.0052, 4.3561)
extrude "Extrude7" [suppressed] in component "Esp32 Module"
extrude "Extrude8" cut sketch "Sketch1 (2)" along normal blind 19 contours L0 L1 L29 L46 | L1 A0 L46 | A0 A3 L32 L33 | L1 L29 L37 L45 L46 | L1 A0 L45 L46 | L1 L2 L29 L43 | L1 A0 L43 | L1 L29 L41 L43 L44 | L1 A0 L43 L44 picked at (-31.2352, 17.761) bodies 2 in component "Esp32 Module"
extrude "Extrude1'''" add sketch "Sketch1" along normal blind 23 and the other way blind -17.5 separate body contours A1 makes body 5
extrude "Extrude9" cut sketch "Sketch1 (2)" along normal blind 5 contours L3 L31 L36 L42 L49 A5 L54 | L3 L31 L36 L40 L42 L47 L48 A5 A6 L52 L54 | L25 L29 L36 L40 L52 | L3 L31 L42 L47 L48 L49 L50 A5 L54 | L36 L48 L49 A5 | L48 L49 A5 | L40 A6 picked at (16.7519, 11.3392) bodies 1 in component "Esp32 Module"
combine "Combine1" operation add target body 5 tool bodies 2 1
extrude "Extrude2''" [suppressed]
extrude "Extrude3'" cut sketch "Sketch1 (2)" along normal blind 18 contours L36 A5 | L36 L48 L49 A5 | L48 L49 A5 | L40 A6 | L40 A6 bodies 5
extrude "Extrude4'" cut sketch "Sketch1 (2)" along normal blind 3 contours L3 L31 L34 L35 L36 L42 A5 L51 L52 L54 | L3 L31 L36 L40 L42 L47 L48 A5 A6 L52 L54 | L3 L31 L42 L47 L48 L49 L50 A5 L54 | L3 L31 L39 L40 L42 A6 L52 L53 L54 bodies 5
extrude "Extrude5'" add sketch "Sketch1 (2)" along normal blind 17 and the other way blind -6.72 contours L3 L31 L34 L35 L36 L42 A5 L51 L52 L54 | L3 L31 L39 L40 L42 A6 L52 L53 L54 bodies 5
sketch "Sketch3" plane through (0, 17.73, 0) normal (0, 1, 0) x (-1, 0, 0)
  circle A0 centre (-16.8768, 11.71) radius 1.25
  circle A1 centre (-16.8768, -11.71) radius 1.25
  arc A2 (30.3853, 14.69) -> (30.3853, -14.69) centre (0, 0) ccw
  line L0 (30.3853, -14.69) -> (17.4432, -14.69)
  line L1 (17.4432, -14.69) -> (17.4432, 14.69)
  line L2 (17.4432, 14.69) -> (30.3853, 14.69)
  line L3 (-16, 21) -> (-6, 21)
  line L4 (-6, 21) -> (-6, 17)
  line L5 (-6, 17) -> (-16, 17)
  line L6 (-16, 17) -> (-16, 21)
  circle A3 centre (-14, 19) radius 1.5
  circle A4 centre (-8, 19) radius 1.5
  line L7 (0, -5) -> (0, 4.9895)
  line L8 (16, 17) -> (16, 21)
  line L9 (6, 21) -> (6, 17)
  line L10 (6, 17) -> (16, 17)
  circle A5 centre (14, 19) radius 1.5
  circle A6 centre (8, 19) radius 1.5
  line L11 (16, 21) -> (6, 21)
  line L12 (6.2332, 0) -> (-19.5768, 0)
  line L13 (-16, -21) -> (-6, -21)
  line L14 (-6, -17) -> (-16, -17)
  line L15 (-6, -21) -> (-6, -17)
  line L16 (-16, -17) -> (-16, -21)
  circle A7 centre (-8, -19) radius 1.5
  circle A8 centre (-14, -19) radius 1.5
  line L17 (16, -17) -> (16, -21)
  line L18 (16, -21) -> (6, -21)
  line L19 (6, -17) -> (16, -17)
  circle A9 centre (8, -19) radius 1.5
  circle A10 centre (14, -19) radius 1.5
  line L20 (6, -21) -> (6, -17)
  circle A11 centre (0, 28) radius 3
  circle A12 centre (0, -28) radius 3
  dimension "d111" = 10
  dimension "d112" = 4
  dimension "d113" = 3
  dimension "d114" = 3
  dimension "d123" = 6
extrude "Extrude6'" cut sketch "Sketch3" along normal blind 20 and the other way blind 25 contours A3 | A4 | A5 | A6 | A7 | A8 | A9 | A10 bodies 5
extrude "Extrude7'" cut sketch "Sketch3" along normal blind -13 and the other way blind 18 contours L3 L4 L5 L6 | L8 L9 L10 L11 | L13 L14 L15 L16 | L17 L18 L19 L20 bodies 5
extrude "Extrude8'" cut sketch "Sketch3" along normal blind 4 and the other way blind 20 contours A11 | A12 bodies 5
combine "Combine1'" operation add target body 3 tool bodies 5 in component "Tower"
extrude "Extrude3''" cut 1 faces at (-6.7699, 9.73, -11.75) along direction (0, 0, 1) blind 2 on bodies 3 bodies 3 in component "Tower"
extrude "Extrude4''" cut 1 faces at (-6.7699, 9.73, 11.75) along direction (0, 0, -1) blind 2 on bodies 3 bodies 3 in component "Tower"
extrude "Extrude5''" cut 2 faces at (14.5768, 12.73, -11.6667) (14.5768, 12.73, 11.6667) along direction (1, 0, 0) blind 0.5 on bodies 3 bodies 3 in component "Tower"
extrude "Extrude6''" cut 2 faces at (5.7368, 6.73, -14.2933) (5.7368, 6.73, 14.2933) along direction (0, 1, 0) blind 9 on bodies 3 bodies 3 in component "Tower"
extrude "Extrude7''" cut sketch "Sketch1 (2)" along normal blind 3 contours L0 L3 L30 L31 L34 L42 L51 L56 | L2 L3 L28 L31 L39 L42 L53 L55 bodies 3 in component "Tower"
component "Base" placed x (1, 0, 0) y (0, 1, 0) z (0, 0, 1) at (0, 0, 0)
component "Esp32 Module" placed x (1, 0, 0) y (0, 1, 0) z (0, 0, 1) at (0, 0, 0)
component "Tower" placed x (1, 0, 0) y (0, 1, 0) z (0, 0, 1) at (0, 0, 0)
component "Lens" placed x (1, 0, 0) y (0, 1, 0) z (0, 0, 1) at (0, 0, 0)
hidden bodies 4
equation "Base_dia = 75 mm"
equation "tolerance_base_to_lens = 0.5 mm"
equation "lens_thickness = 2 mm"
equation "thickness_bottom_of_base = 2 mm"
equation "esp_thickness = 4.73 mm"
equation "d8 = Base_dia - 2 * lens_thickness - tolerance_base_to_lens"
equation "d9 = esp_length"
equation "d10 = esp_width + 1 mm"
equation "esp_length = 51.62 mm"
equation "esp_width = 28.38 mm"
equation "usb_y = 7.5 mm"
equation "usb_x = 5.51 mm"
equation "d15 = usb_x"
equation "d16 = usb_y"
equation "d28 = thickness_bottom_of_base"
equation "d30 = esp_thickness + thickness_bottom_of_base"
equation "esp_pin_depth = 9 mm"
equation "d36 = thickness_bottom_of_base + esp_thickness + esp_pin_depth + 2 mm"
equation "d40 = thickness_bottom_of_base + esp_thickness"
equation "d44 = esp_thickness + thickness_bottom_of_base + esp_pin_depth"
equation "d54 = Base_dia"
equation "d100 = ( 23.42 / 2 ) * 1 mm"
